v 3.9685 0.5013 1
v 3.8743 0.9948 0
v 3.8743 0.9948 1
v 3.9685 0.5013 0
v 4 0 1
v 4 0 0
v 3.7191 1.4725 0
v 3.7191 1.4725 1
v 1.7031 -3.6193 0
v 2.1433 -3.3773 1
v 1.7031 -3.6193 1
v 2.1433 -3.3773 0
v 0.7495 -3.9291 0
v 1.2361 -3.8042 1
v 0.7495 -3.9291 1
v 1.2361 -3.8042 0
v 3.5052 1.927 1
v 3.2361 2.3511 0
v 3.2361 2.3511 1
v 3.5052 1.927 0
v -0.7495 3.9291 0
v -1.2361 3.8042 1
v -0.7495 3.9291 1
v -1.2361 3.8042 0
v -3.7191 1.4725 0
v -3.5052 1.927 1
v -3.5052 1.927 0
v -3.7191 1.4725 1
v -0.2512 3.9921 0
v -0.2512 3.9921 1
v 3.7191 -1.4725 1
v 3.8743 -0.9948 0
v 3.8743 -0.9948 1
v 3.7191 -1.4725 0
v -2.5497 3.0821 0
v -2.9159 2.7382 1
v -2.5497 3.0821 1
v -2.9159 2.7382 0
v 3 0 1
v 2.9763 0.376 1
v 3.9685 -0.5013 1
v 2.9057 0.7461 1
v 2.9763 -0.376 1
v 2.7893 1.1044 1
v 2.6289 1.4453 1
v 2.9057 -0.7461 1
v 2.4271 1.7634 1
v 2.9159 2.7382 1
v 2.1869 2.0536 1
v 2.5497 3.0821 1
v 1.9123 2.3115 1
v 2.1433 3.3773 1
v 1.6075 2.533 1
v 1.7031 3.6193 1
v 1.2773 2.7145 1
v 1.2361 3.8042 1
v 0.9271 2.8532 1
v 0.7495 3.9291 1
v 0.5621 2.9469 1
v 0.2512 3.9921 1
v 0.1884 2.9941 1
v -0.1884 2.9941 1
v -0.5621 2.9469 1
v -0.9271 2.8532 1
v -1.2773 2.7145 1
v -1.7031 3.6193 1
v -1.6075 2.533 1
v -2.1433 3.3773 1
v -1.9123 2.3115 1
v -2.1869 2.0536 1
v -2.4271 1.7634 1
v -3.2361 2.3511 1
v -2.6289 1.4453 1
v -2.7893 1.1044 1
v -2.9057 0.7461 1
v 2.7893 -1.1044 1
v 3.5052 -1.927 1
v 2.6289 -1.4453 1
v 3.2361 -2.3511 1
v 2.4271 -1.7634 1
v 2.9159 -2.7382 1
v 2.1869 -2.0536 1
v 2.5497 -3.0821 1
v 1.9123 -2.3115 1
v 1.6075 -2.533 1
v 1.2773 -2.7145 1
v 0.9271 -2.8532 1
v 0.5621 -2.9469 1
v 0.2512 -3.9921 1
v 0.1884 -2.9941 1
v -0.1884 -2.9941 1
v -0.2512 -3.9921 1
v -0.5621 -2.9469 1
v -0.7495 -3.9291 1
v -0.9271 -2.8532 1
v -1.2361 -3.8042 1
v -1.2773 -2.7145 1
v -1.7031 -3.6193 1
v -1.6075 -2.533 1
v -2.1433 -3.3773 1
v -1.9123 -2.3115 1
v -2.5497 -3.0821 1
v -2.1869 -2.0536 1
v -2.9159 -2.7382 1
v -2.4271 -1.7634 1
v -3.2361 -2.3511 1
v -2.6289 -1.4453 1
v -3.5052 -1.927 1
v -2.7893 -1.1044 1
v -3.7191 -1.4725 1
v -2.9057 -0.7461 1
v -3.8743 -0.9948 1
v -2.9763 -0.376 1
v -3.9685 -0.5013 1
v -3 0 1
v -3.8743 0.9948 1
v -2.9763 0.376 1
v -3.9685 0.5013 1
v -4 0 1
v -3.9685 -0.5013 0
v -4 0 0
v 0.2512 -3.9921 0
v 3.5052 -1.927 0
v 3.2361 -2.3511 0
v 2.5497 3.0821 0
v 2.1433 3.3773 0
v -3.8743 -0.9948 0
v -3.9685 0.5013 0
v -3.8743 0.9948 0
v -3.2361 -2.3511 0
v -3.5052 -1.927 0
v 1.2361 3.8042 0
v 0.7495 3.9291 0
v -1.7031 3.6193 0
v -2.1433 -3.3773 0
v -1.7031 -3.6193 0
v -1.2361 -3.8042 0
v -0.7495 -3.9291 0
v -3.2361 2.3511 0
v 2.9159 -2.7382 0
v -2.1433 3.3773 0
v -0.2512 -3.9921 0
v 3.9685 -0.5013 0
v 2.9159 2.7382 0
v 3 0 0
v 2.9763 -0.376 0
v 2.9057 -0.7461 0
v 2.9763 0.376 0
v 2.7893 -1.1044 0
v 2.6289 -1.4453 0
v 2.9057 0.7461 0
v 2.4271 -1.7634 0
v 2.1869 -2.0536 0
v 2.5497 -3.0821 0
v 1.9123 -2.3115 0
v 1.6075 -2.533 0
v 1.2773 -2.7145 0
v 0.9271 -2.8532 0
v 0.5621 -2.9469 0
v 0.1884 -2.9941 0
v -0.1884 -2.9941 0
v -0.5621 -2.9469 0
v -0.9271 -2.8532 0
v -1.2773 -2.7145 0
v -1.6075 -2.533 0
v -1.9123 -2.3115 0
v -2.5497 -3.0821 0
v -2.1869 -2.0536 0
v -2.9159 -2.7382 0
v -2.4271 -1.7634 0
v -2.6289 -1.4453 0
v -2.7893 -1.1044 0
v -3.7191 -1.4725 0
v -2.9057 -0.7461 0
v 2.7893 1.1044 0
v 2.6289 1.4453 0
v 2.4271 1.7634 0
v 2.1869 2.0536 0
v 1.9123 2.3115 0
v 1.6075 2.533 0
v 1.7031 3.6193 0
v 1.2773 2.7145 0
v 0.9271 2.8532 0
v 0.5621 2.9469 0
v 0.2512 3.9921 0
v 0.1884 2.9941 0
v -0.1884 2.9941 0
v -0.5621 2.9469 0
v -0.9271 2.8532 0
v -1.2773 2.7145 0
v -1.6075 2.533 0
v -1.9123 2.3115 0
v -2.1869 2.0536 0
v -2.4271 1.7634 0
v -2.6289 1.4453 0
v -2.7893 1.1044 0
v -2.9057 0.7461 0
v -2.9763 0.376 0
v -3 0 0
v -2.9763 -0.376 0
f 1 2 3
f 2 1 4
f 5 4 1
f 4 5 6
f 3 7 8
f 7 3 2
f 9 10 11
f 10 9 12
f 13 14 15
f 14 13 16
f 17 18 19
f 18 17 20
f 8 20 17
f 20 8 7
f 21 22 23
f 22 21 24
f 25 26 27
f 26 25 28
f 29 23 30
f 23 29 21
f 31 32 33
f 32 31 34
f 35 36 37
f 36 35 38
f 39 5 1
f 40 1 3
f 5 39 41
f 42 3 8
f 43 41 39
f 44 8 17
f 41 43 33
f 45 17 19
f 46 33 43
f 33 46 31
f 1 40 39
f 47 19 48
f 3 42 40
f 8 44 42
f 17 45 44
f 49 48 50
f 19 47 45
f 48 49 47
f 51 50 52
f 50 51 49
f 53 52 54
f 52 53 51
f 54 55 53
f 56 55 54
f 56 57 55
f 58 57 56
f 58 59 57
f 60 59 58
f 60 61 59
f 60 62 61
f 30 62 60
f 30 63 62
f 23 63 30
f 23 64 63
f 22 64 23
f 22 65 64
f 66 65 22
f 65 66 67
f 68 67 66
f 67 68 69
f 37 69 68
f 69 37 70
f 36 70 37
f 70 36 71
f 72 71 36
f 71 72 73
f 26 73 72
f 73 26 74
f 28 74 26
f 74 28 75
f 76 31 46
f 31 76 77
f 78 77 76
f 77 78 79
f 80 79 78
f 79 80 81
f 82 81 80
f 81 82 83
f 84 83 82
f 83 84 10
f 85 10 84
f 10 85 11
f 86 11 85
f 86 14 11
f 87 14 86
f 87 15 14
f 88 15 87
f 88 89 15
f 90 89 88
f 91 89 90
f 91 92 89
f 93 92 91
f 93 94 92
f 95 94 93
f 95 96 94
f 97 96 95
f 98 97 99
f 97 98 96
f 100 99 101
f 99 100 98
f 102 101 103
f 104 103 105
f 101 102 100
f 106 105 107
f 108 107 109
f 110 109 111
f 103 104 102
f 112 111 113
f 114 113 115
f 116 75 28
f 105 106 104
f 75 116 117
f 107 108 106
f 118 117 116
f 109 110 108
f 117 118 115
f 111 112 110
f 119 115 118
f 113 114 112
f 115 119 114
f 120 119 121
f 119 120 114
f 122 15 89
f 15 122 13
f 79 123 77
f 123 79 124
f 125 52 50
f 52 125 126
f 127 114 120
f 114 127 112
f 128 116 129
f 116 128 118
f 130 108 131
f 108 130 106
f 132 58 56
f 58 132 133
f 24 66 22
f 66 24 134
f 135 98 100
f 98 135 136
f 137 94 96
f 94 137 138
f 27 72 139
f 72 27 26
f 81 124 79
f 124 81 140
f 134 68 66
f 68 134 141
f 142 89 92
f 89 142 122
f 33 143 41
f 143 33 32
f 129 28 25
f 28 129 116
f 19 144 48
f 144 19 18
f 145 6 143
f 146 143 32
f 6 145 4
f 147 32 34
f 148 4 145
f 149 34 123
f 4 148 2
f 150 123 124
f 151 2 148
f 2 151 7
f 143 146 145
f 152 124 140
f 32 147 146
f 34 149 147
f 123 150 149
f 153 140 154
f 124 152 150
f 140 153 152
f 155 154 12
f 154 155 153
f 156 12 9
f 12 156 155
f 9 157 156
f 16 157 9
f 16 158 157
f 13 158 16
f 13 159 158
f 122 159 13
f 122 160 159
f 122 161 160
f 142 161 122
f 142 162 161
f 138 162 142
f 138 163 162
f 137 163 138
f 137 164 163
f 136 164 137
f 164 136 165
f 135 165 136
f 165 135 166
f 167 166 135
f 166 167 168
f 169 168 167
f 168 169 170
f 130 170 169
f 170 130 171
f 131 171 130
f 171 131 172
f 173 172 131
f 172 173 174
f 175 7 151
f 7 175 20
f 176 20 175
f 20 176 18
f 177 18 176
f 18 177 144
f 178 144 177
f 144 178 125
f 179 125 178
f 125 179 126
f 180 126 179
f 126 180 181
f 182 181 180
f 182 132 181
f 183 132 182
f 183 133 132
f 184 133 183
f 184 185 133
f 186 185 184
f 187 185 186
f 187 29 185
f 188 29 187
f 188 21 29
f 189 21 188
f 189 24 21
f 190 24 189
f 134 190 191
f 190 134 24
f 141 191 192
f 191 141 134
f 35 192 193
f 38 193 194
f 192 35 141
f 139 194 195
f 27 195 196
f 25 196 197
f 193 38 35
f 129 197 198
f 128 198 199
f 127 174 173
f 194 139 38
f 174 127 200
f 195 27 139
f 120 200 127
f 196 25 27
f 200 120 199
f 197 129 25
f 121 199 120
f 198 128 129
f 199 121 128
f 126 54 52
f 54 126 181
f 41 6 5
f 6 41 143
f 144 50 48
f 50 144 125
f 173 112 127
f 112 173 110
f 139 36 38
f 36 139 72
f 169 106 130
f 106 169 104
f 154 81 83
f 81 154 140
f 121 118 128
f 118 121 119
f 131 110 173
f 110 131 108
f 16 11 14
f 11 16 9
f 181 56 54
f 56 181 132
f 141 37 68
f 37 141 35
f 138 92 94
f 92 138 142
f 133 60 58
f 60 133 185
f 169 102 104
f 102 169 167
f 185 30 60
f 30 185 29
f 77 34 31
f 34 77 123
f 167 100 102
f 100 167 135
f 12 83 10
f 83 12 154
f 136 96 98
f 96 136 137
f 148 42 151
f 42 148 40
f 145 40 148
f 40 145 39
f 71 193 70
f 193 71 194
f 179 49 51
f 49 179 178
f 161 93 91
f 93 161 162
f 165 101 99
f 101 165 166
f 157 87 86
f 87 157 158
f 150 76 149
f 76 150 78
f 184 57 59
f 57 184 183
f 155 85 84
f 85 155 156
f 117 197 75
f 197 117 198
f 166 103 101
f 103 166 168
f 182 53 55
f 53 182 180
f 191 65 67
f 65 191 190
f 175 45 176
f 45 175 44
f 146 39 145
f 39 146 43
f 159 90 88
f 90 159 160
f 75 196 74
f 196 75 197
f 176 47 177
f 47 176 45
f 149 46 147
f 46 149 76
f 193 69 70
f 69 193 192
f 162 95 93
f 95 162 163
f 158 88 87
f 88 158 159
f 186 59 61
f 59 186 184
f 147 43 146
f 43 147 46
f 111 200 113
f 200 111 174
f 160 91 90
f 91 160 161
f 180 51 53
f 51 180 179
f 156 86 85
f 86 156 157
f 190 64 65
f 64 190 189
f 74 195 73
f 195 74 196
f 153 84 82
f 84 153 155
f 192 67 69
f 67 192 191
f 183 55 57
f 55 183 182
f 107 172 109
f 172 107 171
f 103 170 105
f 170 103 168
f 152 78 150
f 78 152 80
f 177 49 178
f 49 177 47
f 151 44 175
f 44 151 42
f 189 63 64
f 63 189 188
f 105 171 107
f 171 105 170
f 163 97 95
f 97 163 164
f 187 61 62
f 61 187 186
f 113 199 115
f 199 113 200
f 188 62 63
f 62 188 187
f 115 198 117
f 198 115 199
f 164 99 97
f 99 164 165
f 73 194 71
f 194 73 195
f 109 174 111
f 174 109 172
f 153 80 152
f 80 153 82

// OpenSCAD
/*
	freiBot washer

	2015 by stochri
*/


$fn = 50;

axLength=1;
axDiameter=8;
axHole=6;

ring(axLength,axHole,axDiameter);

module ring(thickness,innerDiameter,outerDiameter)
{
	difference()
	{
		cylinder(thickness,outerDiameter/2,outerDiameter/2);
		cylinder(thickness,innerDiameter/2,innerDiameter/2);
	}	
}
